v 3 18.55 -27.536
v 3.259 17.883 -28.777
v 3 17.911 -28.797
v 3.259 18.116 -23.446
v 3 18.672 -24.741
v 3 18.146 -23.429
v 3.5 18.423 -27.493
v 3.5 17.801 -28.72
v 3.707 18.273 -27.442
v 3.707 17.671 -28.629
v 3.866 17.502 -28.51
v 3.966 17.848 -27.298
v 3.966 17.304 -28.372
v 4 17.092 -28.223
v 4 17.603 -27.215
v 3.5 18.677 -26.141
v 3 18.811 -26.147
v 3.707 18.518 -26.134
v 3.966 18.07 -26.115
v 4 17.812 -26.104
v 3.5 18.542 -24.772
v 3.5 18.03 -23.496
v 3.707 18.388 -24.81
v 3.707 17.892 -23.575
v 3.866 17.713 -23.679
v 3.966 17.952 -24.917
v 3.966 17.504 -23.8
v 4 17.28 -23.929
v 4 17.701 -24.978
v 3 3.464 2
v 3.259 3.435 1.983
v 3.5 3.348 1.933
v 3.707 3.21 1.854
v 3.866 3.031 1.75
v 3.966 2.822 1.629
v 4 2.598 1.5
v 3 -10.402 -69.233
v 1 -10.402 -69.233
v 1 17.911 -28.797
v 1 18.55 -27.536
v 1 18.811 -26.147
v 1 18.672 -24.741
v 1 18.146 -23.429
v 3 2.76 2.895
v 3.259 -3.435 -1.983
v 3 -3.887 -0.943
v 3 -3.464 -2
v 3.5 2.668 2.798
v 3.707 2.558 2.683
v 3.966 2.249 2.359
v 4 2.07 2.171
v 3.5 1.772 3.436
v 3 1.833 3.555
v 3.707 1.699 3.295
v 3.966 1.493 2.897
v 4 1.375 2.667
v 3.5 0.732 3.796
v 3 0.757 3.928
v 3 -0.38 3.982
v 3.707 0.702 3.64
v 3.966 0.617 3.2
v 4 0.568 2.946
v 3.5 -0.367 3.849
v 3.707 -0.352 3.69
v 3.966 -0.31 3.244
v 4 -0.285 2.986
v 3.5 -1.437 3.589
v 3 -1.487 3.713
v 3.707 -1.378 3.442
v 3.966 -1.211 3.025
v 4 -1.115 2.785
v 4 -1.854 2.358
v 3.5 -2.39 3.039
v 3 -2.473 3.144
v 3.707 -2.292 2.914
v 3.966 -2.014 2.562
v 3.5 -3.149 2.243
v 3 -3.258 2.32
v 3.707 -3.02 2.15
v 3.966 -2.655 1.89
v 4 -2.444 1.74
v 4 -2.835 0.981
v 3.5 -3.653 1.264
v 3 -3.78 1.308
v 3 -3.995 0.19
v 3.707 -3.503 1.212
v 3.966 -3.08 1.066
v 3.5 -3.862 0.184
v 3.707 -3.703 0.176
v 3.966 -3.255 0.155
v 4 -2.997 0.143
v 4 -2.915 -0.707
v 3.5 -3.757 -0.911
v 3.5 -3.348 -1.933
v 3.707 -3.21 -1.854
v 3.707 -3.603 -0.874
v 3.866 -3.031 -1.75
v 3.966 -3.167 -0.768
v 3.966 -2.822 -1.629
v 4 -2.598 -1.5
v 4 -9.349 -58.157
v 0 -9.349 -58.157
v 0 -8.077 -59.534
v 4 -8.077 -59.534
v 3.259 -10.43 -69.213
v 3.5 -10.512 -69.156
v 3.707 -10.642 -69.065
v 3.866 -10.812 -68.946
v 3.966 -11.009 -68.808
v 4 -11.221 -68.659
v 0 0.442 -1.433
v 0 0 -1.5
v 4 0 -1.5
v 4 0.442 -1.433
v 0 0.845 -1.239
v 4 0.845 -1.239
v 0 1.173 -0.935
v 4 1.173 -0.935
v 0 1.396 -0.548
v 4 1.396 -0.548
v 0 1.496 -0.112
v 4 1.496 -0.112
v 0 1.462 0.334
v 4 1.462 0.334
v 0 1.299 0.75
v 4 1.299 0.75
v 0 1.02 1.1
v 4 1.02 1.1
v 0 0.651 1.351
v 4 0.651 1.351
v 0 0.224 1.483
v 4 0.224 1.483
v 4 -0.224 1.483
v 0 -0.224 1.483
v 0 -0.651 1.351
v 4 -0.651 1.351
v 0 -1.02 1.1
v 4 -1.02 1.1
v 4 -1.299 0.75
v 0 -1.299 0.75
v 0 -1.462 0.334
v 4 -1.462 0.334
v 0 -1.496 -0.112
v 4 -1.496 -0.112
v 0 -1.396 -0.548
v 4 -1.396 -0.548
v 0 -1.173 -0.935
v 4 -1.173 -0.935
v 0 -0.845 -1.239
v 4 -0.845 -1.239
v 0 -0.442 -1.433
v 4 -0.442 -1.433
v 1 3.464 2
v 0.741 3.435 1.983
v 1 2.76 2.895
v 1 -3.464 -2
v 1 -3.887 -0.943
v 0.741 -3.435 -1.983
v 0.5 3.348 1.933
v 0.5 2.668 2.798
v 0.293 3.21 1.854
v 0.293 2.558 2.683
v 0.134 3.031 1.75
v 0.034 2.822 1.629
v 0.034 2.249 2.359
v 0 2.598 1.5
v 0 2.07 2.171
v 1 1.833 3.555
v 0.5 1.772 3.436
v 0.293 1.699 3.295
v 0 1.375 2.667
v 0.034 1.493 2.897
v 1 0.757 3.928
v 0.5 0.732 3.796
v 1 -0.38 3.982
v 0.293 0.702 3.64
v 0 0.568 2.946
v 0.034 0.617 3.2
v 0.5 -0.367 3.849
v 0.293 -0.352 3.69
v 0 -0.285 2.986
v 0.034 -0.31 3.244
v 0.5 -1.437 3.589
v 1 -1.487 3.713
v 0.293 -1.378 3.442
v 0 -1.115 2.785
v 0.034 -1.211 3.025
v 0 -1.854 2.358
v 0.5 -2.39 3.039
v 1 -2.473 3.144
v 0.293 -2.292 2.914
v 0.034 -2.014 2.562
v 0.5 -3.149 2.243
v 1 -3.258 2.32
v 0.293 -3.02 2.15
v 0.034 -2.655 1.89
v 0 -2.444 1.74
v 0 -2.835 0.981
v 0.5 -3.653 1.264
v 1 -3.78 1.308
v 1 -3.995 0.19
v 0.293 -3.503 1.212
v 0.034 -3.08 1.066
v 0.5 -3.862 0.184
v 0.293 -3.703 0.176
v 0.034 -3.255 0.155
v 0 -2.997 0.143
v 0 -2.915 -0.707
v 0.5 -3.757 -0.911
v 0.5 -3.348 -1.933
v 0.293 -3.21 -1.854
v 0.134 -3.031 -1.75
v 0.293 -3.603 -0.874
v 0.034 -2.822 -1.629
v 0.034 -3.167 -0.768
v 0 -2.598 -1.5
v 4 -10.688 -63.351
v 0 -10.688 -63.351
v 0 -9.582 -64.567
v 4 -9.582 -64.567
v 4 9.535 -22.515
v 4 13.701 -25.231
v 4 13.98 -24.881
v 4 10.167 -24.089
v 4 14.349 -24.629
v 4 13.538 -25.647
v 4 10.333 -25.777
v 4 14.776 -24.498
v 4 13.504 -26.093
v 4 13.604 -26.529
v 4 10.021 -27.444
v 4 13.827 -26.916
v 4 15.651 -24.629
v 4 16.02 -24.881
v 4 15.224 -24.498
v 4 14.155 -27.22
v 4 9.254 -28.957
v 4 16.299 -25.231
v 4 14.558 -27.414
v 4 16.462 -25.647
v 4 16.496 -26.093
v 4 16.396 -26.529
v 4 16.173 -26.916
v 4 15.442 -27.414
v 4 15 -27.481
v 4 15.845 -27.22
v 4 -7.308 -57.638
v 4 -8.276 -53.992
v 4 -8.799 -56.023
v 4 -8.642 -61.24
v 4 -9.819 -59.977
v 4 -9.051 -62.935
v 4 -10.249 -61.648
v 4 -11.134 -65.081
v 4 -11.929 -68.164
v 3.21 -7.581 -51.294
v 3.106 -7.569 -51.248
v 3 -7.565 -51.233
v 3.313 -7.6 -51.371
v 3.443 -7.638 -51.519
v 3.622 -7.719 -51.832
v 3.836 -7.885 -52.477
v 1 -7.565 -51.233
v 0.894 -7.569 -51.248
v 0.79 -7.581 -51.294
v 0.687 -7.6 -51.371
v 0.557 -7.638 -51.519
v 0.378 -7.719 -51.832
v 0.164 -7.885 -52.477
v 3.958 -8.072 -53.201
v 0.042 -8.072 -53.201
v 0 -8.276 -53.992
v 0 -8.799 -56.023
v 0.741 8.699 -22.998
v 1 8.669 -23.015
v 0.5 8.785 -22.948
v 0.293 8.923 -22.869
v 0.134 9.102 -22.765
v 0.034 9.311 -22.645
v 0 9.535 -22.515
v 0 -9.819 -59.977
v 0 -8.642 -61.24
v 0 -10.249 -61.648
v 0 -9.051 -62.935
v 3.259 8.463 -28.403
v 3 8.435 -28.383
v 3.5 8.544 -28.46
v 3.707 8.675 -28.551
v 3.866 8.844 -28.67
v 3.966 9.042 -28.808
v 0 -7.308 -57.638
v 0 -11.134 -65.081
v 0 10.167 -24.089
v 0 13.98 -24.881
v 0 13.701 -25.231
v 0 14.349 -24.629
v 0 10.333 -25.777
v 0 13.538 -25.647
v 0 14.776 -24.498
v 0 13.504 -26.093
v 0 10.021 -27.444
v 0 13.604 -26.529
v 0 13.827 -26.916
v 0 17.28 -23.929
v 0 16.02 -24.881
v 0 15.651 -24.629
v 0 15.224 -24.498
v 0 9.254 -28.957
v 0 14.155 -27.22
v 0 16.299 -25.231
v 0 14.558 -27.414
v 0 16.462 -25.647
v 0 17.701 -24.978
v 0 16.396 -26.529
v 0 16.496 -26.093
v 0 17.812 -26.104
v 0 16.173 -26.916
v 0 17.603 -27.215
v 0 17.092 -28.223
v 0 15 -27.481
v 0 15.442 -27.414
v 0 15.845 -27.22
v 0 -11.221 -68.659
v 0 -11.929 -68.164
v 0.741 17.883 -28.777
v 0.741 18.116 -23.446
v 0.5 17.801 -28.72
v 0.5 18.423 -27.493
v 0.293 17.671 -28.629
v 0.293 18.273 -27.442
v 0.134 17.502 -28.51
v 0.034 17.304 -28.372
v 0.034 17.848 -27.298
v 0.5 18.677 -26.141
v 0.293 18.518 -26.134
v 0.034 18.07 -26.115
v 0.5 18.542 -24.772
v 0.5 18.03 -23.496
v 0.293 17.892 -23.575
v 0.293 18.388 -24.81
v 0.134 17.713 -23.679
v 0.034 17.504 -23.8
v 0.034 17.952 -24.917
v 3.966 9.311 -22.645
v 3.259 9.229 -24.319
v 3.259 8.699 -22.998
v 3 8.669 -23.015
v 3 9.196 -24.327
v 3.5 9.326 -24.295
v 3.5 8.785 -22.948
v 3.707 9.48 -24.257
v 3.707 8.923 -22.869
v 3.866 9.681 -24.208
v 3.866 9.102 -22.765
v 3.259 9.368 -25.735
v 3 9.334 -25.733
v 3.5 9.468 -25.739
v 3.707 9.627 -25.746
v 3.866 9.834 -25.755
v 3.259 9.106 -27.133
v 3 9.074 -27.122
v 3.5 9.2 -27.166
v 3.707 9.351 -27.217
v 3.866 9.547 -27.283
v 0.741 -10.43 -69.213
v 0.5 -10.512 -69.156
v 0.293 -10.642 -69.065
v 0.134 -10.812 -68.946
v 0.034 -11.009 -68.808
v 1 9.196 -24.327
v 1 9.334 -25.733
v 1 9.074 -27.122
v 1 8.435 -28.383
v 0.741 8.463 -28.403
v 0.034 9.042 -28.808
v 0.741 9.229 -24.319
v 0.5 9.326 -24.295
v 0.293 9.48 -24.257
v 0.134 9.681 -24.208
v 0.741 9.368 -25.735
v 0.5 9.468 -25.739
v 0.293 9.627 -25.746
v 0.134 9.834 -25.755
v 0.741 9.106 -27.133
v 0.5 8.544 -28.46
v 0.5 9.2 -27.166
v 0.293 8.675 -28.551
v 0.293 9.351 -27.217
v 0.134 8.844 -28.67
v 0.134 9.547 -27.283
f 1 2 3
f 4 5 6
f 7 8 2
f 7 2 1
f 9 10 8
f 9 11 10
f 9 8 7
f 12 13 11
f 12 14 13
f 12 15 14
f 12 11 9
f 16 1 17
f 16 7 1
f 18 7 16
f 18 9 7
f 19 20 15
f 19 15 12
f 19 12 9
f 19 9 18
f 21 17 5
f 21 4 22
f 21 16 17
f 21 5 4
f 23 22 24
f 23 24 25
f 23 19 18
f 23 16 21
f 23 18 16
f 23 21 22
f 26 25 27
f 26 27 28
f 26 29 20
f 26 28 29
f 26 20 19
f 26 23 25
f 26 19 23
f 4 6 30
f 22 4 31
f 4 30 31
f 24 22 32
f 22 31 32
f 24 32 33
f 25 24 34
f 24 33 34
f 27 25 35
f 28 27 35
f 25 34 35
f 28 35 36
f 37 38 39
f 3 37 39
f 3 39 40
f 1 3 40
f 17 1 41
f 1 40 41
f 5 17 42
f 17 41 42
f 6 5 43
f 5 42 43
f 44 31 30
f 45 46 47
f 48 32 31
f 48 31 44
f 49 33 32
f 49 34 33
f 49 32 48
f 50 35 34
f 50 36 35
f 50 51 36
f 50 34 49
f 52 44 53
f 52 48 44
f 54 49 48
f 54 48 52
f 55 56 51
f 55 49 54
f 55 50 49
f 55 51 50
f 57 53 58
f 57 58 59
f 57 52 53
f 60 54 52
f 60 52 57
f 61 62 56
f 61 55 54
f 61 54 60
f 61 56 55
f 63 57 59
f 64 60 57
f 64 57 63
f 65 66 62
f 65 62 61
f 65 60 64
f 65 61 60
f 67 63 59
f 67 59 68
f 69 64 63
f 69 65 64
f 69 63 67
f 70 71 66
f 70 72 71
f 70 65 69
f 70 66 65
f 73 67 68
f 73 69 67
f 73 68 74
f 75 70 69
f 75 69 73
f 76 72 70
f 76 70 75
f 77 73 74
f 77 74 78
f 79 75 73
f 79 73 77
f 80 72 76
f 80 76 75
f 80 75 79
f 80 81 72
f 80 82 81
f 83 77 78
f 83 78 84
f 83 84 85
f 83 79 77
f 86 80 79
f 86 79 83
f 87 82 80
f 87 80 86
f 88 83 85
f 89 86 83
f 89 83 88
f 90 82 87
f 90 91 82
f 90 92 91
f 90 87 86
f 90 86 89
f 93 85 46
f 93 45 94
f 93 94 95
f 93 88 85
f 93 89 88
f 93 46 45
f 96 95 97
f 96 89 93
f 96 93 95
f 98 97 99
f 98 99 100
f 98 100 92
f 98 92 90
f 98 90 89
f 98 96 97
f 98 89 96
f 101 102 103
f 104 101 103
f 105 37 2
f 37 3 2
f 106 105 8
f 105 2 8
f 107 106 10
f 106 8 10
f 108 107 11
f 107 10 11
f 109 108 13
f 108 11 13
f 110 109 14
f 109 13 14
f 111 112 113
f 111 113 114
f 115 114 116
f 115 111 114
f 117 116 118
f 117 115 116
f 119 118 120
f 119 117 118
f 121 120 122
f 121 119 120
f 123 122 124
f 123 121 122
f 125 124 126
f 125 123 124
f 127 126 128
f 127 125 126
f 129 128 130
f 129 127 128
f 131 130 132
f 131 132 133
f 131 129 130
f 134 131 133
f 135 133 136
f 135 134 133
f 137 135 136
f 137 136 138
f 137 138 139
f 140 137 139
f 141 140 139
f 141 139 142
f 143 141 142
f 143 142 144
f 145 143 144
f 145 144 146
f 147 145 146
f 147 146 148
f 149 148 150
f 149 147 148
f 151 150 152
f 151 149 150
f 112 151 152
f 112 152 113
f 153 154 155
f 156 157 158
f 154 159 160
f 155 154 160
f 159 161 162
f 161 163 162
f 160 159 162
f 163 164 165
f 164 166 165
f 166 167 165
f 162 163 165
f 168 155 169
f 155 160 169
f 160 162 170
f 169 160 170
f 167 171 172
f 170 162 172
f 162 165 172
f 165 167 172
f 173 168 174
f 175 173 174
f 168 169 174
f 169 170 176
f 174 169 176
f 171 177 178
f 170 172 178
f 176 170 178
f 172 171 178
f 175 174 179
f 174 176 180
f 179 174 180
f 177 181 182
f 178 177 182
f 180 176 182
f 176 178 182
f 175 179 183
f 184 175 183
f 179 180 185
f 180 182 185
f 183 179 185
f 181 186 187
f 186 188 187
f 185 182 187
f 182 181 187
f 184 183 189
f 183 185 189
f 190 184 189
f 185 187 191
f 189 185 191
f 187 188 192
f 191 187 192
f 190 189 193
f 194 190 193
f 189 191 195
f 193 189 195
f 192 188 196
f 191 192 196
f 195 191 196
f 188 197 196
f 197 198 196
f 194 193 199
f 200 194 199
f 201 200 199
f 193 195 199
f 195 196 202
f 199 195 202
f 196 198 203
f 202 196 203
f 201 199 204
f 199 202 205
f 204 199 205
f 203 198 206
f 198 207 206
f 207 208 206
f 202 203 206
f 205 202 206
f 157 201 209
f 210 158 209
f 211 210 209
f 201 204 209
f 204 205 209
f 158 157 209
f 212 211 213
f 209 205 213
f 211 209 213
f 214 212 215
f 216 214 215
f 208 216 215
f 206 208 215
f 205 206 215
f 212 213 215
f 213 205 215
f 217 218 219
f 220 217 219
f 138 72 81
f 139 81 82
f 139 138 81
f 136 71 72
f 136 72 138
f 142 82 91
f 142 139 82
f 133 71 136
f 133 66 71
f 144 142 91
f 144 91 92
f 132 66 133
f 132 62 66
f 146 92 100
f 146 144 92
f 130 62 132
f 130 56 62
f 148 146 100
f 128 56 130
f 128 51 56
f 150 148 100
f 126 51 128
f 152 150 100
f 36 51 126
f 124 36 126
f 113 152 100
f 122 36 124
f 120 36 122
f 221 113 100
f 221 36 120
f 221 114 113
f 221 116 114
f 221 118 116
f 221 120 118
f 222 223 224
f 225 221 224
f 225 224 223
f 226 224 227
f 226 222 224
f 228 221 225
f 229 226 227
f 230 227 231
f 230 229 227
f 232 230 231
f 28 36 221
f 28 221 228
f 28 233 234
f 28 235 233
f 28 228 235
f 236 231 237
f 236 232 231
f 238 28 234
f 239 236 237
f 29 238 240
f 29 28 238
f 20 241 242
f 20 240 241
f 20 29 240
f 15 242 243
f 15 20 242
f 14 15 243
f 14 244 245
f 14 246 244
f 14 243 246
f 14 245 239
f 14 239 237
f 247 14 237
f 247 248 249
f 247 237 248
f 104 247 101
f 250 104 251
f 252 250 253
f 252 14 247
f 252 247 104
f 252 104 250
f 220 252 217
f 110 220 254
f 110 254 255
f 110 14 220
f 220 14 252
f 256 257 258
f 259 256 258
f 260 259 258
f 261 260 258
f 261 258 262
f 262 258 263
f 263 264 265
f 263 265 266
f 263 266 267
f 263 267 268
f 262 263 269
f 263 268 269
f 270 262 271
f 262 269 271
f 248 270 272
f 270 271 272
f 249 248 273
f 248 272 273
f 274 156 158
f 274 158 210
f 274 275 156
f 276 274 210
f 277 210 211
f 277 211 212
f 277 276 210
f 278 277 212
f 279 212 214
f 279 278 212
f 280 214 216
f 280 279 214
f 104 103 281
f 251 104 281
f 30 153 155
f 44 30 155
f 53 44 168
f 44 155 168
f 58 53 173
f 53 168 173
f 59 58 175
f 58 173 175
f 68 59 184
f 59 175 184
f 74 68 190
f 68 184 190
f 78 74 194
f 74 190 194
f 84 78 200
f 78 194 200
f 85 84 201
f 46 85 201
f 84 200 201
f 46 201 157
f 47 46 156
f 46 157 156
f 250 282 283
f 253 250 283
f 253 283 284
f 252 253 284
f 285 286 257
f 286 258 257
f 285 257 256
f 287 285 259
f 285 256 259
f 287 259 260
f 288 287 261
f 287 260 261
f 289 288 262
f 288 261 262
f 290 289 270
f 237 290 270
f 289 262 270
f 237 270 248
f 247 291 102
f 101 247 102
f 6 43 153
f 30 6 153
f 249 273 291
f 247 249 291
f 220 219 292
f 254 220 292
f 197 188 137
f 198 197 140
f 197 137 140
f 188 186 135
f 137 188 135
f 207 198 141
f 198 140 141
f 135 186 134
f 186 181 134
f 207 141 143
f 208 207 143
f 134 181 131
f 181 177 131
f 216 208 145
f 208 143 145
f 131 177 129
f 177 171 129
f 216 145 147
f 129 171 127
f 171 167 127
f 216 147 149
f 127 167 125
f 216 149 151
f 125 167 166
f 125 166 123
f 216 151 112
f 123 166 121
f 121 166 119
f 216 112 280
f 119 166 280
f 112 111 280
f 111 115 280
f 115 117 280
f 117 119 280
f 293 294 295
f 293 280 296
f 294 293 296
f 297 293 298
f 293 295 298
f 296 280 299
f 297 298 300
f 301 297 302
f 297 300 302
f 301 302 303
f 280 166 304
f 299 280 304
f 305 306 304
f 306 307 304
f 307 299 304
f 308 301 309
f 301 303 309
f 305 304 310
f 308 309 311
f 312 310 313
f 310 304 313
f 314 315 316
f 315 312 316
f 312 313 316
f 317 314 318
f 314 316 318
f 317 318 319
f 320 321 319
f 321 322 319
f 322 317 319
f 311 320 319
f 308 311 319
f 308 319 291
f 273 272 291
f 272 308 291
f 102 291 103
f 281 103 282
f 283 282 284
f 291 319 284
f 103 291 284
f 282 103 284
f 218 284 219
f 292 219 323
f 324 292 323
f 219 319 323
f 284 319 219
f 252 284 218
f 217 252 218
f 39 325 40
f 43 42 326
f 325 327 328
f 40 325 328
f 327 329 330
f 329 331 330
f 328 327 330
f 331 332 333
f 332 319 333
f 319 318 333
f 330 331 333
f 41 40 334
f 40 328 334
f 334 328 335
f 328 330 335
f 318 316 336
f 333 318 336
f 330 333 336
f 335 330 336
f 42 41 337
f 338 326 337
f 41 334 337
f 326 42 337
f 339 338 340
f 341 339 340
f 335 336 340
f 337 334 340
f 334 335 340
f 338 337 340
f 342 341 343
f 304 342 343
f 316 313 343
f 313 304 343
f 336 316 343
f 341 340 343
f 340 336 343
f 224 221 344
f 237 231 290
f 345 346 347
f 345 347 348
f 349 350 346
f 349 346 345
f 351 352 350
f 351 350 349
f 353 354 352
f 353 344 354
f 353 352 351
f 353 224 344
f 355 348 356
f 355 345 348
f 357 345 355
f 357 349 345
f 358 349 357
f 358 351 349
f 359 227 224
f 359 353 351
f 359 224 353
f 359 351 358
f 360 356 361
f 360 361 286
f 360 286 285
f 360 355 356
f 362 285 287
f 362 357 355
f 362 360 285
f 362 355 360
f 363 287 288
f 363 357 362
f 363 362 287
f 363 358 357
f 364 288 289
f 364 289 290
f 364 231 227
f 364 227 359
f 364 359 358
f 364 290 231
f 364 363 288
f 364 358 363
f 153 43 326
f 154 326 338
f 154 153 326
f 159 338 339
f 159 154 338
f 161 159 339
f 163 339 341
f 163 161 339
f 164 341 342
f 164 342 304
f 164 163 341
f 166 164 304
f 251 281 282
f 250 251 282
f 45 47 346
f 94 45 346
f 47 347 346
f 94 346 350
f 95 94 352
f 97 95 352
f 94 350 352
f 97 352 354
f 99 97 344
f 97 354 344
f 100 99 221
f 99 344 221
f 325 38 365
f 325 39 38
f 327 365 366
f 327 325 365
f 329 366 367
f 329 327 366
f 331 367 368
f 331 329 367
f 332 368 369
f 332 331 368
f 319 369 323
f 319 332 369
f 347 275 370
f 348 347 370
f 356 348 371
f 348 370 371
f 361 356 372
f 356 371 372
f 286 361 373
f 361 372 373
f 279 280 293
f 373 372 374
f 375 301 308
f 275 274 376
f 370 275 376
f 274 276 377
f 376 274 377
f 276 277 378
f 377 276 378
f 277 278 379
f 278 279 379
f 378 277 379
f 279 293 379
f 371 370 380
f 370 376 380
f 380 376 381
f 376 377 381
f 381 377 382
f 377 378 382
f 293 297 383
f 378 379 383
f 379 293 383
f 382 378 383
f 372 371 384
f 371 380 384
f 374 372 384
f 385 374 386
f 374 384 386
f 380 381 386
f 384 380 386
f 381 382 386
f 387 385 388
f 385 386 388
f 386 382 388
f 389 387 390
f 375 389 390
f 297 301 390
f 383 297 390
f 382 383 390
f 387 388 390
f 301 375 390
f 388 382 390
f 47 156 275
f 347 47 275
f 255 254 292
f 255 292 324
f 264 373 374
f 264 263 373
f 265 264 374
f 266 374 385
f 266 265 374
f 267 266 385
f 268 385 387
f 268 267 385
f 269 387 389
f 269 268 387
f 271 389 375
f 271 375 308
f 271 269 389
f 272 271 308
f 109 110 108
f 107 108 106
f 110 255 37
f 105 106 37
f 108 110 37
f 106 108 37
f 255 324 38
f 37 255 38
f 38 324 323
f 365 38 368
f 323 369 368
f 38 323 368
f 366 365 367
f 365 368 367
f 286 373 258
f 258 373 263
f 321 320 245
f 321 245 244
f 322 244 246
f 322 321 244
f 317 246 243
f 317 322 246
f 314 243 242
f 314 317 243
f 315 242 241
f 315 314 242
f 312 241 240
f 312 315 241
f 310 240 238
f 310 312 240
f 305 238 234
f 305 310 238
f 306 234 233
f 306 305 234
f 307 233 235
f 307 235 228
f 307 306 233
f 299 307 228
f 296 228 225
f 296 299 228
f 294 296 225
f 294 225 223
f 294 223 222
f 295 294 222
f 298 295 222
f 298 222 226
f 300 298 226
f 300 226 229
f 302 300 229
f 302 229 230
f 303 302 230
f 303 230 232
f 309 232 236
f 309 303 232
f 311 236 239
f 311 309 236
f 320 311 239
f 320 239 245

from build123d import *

# Parameters (mm, degrees)
SKETCH1_R           = 1.5
BOSS_EXTRUDE1_DEPTH = 4
FILLET1_R           = 1


with BuildPart() as part:
    # Sketch1 → Boss-Extrude1 (new body)
    with BuildSketch(Plane(origin=(0, 0, 0), x_dir=(0, 0, -1), z_dir=(1, 0, 0))):
        with BuildLine():
            Line((2, -3.464101615), (23.015290845, 8.669082211))
            ThreePointArc((23.015290845, 8.669082211), (25.733387782, 9.3341963), (28.383173027, 8.434715414))
            Line((28.383173027, 8.434715414), (51.232670073, -7.564674663))
            Line((51.232670073, -7.564674663), (56.023067, -8.799461594))
            Line((56.023067, -8.799461594), (57.638075063, -7.307602004))
            Line((57.638075063, -7.307602004), (58.156839412, -9.349469104))
            Line((58.156839412, -9.349469104), (59.53422498, -8.07711269))
            Line((59.53422498, -8.07711269), (59.976661488, -9.818551844))
            Line((59.976661488, -9.818551844), (61.239859239, -8.642065932))
            Line((61.239859239, -8.642065932), (61.648229646, -10.249420215))
            Line((61.648229646, -10.249420215), (62.934954569, -9.051022147))
            Line((62.934954569, -9.051022147), (63.350930911, -10.688313547))
            Line((63.350930911, -10.688313547), (64.567456775, -9.58151124))
            Line((64.567456775, -9.58151124), (65.081008751, -11.134263546))
            Line((65.081008751, -11.134263546), (68.163696398, -11.928866264))
            Line((68.163696398, -11.928866264), (69.232670073, -10.40221364))
            Line((69.232670073, -10.40221364), (28.796925265, 17.911199687))
            ThreePointArc((28.796925265, 17.911199687), (26.147140021, 18.810680574), (23.429043084, 18.145566485))
            Line((23.429043084, 18.145566485), (-2, 3.464101615))
            ThreePointArc((-2, 3.464101615), (-3.464101615, -2), (2, -3.464101615))
        make_face()
        Circle(SKETCH1_R, mode=Mode.SUBTRACT)
        with Locations((25.980762114, 15)):
            Circle(SKETCH1_R, mode=Mode.SUBTRACT)
    extrude(amount=BOSS_EXTRUDE1_DEPTH)

    # Fillet1
    fillet1_edges = [part.edges().sort_by_distance(p)[0] for p in [
        (4, 9.3341963, -25.733387782),
        (4, 0.435020376, -39.80792155),
        (0, 10.80483405, -10.714521542),
        (0, 18.810680574, -26.147140021),
        (0, 3.754493023, -49.014797669),
        (0, 0.435020376, -39.80792155),
        (0, 9.3341963, -25.733387782),
        (0, 2.602490298, -12.507645422),
        (0, -2, 3.464101615),
        (4, -2, 3.464101615),
        (4, 3.754493023, -49.014797669),
        (4, 18.810680574, -26.147140021),
        (4, 10.80483405, -10.714521542),
        (4, 2.602490298, -12.507645422),
    ]]
    fillet(fillet1_edges, radius=FILLET1_R)


solid = part.part
